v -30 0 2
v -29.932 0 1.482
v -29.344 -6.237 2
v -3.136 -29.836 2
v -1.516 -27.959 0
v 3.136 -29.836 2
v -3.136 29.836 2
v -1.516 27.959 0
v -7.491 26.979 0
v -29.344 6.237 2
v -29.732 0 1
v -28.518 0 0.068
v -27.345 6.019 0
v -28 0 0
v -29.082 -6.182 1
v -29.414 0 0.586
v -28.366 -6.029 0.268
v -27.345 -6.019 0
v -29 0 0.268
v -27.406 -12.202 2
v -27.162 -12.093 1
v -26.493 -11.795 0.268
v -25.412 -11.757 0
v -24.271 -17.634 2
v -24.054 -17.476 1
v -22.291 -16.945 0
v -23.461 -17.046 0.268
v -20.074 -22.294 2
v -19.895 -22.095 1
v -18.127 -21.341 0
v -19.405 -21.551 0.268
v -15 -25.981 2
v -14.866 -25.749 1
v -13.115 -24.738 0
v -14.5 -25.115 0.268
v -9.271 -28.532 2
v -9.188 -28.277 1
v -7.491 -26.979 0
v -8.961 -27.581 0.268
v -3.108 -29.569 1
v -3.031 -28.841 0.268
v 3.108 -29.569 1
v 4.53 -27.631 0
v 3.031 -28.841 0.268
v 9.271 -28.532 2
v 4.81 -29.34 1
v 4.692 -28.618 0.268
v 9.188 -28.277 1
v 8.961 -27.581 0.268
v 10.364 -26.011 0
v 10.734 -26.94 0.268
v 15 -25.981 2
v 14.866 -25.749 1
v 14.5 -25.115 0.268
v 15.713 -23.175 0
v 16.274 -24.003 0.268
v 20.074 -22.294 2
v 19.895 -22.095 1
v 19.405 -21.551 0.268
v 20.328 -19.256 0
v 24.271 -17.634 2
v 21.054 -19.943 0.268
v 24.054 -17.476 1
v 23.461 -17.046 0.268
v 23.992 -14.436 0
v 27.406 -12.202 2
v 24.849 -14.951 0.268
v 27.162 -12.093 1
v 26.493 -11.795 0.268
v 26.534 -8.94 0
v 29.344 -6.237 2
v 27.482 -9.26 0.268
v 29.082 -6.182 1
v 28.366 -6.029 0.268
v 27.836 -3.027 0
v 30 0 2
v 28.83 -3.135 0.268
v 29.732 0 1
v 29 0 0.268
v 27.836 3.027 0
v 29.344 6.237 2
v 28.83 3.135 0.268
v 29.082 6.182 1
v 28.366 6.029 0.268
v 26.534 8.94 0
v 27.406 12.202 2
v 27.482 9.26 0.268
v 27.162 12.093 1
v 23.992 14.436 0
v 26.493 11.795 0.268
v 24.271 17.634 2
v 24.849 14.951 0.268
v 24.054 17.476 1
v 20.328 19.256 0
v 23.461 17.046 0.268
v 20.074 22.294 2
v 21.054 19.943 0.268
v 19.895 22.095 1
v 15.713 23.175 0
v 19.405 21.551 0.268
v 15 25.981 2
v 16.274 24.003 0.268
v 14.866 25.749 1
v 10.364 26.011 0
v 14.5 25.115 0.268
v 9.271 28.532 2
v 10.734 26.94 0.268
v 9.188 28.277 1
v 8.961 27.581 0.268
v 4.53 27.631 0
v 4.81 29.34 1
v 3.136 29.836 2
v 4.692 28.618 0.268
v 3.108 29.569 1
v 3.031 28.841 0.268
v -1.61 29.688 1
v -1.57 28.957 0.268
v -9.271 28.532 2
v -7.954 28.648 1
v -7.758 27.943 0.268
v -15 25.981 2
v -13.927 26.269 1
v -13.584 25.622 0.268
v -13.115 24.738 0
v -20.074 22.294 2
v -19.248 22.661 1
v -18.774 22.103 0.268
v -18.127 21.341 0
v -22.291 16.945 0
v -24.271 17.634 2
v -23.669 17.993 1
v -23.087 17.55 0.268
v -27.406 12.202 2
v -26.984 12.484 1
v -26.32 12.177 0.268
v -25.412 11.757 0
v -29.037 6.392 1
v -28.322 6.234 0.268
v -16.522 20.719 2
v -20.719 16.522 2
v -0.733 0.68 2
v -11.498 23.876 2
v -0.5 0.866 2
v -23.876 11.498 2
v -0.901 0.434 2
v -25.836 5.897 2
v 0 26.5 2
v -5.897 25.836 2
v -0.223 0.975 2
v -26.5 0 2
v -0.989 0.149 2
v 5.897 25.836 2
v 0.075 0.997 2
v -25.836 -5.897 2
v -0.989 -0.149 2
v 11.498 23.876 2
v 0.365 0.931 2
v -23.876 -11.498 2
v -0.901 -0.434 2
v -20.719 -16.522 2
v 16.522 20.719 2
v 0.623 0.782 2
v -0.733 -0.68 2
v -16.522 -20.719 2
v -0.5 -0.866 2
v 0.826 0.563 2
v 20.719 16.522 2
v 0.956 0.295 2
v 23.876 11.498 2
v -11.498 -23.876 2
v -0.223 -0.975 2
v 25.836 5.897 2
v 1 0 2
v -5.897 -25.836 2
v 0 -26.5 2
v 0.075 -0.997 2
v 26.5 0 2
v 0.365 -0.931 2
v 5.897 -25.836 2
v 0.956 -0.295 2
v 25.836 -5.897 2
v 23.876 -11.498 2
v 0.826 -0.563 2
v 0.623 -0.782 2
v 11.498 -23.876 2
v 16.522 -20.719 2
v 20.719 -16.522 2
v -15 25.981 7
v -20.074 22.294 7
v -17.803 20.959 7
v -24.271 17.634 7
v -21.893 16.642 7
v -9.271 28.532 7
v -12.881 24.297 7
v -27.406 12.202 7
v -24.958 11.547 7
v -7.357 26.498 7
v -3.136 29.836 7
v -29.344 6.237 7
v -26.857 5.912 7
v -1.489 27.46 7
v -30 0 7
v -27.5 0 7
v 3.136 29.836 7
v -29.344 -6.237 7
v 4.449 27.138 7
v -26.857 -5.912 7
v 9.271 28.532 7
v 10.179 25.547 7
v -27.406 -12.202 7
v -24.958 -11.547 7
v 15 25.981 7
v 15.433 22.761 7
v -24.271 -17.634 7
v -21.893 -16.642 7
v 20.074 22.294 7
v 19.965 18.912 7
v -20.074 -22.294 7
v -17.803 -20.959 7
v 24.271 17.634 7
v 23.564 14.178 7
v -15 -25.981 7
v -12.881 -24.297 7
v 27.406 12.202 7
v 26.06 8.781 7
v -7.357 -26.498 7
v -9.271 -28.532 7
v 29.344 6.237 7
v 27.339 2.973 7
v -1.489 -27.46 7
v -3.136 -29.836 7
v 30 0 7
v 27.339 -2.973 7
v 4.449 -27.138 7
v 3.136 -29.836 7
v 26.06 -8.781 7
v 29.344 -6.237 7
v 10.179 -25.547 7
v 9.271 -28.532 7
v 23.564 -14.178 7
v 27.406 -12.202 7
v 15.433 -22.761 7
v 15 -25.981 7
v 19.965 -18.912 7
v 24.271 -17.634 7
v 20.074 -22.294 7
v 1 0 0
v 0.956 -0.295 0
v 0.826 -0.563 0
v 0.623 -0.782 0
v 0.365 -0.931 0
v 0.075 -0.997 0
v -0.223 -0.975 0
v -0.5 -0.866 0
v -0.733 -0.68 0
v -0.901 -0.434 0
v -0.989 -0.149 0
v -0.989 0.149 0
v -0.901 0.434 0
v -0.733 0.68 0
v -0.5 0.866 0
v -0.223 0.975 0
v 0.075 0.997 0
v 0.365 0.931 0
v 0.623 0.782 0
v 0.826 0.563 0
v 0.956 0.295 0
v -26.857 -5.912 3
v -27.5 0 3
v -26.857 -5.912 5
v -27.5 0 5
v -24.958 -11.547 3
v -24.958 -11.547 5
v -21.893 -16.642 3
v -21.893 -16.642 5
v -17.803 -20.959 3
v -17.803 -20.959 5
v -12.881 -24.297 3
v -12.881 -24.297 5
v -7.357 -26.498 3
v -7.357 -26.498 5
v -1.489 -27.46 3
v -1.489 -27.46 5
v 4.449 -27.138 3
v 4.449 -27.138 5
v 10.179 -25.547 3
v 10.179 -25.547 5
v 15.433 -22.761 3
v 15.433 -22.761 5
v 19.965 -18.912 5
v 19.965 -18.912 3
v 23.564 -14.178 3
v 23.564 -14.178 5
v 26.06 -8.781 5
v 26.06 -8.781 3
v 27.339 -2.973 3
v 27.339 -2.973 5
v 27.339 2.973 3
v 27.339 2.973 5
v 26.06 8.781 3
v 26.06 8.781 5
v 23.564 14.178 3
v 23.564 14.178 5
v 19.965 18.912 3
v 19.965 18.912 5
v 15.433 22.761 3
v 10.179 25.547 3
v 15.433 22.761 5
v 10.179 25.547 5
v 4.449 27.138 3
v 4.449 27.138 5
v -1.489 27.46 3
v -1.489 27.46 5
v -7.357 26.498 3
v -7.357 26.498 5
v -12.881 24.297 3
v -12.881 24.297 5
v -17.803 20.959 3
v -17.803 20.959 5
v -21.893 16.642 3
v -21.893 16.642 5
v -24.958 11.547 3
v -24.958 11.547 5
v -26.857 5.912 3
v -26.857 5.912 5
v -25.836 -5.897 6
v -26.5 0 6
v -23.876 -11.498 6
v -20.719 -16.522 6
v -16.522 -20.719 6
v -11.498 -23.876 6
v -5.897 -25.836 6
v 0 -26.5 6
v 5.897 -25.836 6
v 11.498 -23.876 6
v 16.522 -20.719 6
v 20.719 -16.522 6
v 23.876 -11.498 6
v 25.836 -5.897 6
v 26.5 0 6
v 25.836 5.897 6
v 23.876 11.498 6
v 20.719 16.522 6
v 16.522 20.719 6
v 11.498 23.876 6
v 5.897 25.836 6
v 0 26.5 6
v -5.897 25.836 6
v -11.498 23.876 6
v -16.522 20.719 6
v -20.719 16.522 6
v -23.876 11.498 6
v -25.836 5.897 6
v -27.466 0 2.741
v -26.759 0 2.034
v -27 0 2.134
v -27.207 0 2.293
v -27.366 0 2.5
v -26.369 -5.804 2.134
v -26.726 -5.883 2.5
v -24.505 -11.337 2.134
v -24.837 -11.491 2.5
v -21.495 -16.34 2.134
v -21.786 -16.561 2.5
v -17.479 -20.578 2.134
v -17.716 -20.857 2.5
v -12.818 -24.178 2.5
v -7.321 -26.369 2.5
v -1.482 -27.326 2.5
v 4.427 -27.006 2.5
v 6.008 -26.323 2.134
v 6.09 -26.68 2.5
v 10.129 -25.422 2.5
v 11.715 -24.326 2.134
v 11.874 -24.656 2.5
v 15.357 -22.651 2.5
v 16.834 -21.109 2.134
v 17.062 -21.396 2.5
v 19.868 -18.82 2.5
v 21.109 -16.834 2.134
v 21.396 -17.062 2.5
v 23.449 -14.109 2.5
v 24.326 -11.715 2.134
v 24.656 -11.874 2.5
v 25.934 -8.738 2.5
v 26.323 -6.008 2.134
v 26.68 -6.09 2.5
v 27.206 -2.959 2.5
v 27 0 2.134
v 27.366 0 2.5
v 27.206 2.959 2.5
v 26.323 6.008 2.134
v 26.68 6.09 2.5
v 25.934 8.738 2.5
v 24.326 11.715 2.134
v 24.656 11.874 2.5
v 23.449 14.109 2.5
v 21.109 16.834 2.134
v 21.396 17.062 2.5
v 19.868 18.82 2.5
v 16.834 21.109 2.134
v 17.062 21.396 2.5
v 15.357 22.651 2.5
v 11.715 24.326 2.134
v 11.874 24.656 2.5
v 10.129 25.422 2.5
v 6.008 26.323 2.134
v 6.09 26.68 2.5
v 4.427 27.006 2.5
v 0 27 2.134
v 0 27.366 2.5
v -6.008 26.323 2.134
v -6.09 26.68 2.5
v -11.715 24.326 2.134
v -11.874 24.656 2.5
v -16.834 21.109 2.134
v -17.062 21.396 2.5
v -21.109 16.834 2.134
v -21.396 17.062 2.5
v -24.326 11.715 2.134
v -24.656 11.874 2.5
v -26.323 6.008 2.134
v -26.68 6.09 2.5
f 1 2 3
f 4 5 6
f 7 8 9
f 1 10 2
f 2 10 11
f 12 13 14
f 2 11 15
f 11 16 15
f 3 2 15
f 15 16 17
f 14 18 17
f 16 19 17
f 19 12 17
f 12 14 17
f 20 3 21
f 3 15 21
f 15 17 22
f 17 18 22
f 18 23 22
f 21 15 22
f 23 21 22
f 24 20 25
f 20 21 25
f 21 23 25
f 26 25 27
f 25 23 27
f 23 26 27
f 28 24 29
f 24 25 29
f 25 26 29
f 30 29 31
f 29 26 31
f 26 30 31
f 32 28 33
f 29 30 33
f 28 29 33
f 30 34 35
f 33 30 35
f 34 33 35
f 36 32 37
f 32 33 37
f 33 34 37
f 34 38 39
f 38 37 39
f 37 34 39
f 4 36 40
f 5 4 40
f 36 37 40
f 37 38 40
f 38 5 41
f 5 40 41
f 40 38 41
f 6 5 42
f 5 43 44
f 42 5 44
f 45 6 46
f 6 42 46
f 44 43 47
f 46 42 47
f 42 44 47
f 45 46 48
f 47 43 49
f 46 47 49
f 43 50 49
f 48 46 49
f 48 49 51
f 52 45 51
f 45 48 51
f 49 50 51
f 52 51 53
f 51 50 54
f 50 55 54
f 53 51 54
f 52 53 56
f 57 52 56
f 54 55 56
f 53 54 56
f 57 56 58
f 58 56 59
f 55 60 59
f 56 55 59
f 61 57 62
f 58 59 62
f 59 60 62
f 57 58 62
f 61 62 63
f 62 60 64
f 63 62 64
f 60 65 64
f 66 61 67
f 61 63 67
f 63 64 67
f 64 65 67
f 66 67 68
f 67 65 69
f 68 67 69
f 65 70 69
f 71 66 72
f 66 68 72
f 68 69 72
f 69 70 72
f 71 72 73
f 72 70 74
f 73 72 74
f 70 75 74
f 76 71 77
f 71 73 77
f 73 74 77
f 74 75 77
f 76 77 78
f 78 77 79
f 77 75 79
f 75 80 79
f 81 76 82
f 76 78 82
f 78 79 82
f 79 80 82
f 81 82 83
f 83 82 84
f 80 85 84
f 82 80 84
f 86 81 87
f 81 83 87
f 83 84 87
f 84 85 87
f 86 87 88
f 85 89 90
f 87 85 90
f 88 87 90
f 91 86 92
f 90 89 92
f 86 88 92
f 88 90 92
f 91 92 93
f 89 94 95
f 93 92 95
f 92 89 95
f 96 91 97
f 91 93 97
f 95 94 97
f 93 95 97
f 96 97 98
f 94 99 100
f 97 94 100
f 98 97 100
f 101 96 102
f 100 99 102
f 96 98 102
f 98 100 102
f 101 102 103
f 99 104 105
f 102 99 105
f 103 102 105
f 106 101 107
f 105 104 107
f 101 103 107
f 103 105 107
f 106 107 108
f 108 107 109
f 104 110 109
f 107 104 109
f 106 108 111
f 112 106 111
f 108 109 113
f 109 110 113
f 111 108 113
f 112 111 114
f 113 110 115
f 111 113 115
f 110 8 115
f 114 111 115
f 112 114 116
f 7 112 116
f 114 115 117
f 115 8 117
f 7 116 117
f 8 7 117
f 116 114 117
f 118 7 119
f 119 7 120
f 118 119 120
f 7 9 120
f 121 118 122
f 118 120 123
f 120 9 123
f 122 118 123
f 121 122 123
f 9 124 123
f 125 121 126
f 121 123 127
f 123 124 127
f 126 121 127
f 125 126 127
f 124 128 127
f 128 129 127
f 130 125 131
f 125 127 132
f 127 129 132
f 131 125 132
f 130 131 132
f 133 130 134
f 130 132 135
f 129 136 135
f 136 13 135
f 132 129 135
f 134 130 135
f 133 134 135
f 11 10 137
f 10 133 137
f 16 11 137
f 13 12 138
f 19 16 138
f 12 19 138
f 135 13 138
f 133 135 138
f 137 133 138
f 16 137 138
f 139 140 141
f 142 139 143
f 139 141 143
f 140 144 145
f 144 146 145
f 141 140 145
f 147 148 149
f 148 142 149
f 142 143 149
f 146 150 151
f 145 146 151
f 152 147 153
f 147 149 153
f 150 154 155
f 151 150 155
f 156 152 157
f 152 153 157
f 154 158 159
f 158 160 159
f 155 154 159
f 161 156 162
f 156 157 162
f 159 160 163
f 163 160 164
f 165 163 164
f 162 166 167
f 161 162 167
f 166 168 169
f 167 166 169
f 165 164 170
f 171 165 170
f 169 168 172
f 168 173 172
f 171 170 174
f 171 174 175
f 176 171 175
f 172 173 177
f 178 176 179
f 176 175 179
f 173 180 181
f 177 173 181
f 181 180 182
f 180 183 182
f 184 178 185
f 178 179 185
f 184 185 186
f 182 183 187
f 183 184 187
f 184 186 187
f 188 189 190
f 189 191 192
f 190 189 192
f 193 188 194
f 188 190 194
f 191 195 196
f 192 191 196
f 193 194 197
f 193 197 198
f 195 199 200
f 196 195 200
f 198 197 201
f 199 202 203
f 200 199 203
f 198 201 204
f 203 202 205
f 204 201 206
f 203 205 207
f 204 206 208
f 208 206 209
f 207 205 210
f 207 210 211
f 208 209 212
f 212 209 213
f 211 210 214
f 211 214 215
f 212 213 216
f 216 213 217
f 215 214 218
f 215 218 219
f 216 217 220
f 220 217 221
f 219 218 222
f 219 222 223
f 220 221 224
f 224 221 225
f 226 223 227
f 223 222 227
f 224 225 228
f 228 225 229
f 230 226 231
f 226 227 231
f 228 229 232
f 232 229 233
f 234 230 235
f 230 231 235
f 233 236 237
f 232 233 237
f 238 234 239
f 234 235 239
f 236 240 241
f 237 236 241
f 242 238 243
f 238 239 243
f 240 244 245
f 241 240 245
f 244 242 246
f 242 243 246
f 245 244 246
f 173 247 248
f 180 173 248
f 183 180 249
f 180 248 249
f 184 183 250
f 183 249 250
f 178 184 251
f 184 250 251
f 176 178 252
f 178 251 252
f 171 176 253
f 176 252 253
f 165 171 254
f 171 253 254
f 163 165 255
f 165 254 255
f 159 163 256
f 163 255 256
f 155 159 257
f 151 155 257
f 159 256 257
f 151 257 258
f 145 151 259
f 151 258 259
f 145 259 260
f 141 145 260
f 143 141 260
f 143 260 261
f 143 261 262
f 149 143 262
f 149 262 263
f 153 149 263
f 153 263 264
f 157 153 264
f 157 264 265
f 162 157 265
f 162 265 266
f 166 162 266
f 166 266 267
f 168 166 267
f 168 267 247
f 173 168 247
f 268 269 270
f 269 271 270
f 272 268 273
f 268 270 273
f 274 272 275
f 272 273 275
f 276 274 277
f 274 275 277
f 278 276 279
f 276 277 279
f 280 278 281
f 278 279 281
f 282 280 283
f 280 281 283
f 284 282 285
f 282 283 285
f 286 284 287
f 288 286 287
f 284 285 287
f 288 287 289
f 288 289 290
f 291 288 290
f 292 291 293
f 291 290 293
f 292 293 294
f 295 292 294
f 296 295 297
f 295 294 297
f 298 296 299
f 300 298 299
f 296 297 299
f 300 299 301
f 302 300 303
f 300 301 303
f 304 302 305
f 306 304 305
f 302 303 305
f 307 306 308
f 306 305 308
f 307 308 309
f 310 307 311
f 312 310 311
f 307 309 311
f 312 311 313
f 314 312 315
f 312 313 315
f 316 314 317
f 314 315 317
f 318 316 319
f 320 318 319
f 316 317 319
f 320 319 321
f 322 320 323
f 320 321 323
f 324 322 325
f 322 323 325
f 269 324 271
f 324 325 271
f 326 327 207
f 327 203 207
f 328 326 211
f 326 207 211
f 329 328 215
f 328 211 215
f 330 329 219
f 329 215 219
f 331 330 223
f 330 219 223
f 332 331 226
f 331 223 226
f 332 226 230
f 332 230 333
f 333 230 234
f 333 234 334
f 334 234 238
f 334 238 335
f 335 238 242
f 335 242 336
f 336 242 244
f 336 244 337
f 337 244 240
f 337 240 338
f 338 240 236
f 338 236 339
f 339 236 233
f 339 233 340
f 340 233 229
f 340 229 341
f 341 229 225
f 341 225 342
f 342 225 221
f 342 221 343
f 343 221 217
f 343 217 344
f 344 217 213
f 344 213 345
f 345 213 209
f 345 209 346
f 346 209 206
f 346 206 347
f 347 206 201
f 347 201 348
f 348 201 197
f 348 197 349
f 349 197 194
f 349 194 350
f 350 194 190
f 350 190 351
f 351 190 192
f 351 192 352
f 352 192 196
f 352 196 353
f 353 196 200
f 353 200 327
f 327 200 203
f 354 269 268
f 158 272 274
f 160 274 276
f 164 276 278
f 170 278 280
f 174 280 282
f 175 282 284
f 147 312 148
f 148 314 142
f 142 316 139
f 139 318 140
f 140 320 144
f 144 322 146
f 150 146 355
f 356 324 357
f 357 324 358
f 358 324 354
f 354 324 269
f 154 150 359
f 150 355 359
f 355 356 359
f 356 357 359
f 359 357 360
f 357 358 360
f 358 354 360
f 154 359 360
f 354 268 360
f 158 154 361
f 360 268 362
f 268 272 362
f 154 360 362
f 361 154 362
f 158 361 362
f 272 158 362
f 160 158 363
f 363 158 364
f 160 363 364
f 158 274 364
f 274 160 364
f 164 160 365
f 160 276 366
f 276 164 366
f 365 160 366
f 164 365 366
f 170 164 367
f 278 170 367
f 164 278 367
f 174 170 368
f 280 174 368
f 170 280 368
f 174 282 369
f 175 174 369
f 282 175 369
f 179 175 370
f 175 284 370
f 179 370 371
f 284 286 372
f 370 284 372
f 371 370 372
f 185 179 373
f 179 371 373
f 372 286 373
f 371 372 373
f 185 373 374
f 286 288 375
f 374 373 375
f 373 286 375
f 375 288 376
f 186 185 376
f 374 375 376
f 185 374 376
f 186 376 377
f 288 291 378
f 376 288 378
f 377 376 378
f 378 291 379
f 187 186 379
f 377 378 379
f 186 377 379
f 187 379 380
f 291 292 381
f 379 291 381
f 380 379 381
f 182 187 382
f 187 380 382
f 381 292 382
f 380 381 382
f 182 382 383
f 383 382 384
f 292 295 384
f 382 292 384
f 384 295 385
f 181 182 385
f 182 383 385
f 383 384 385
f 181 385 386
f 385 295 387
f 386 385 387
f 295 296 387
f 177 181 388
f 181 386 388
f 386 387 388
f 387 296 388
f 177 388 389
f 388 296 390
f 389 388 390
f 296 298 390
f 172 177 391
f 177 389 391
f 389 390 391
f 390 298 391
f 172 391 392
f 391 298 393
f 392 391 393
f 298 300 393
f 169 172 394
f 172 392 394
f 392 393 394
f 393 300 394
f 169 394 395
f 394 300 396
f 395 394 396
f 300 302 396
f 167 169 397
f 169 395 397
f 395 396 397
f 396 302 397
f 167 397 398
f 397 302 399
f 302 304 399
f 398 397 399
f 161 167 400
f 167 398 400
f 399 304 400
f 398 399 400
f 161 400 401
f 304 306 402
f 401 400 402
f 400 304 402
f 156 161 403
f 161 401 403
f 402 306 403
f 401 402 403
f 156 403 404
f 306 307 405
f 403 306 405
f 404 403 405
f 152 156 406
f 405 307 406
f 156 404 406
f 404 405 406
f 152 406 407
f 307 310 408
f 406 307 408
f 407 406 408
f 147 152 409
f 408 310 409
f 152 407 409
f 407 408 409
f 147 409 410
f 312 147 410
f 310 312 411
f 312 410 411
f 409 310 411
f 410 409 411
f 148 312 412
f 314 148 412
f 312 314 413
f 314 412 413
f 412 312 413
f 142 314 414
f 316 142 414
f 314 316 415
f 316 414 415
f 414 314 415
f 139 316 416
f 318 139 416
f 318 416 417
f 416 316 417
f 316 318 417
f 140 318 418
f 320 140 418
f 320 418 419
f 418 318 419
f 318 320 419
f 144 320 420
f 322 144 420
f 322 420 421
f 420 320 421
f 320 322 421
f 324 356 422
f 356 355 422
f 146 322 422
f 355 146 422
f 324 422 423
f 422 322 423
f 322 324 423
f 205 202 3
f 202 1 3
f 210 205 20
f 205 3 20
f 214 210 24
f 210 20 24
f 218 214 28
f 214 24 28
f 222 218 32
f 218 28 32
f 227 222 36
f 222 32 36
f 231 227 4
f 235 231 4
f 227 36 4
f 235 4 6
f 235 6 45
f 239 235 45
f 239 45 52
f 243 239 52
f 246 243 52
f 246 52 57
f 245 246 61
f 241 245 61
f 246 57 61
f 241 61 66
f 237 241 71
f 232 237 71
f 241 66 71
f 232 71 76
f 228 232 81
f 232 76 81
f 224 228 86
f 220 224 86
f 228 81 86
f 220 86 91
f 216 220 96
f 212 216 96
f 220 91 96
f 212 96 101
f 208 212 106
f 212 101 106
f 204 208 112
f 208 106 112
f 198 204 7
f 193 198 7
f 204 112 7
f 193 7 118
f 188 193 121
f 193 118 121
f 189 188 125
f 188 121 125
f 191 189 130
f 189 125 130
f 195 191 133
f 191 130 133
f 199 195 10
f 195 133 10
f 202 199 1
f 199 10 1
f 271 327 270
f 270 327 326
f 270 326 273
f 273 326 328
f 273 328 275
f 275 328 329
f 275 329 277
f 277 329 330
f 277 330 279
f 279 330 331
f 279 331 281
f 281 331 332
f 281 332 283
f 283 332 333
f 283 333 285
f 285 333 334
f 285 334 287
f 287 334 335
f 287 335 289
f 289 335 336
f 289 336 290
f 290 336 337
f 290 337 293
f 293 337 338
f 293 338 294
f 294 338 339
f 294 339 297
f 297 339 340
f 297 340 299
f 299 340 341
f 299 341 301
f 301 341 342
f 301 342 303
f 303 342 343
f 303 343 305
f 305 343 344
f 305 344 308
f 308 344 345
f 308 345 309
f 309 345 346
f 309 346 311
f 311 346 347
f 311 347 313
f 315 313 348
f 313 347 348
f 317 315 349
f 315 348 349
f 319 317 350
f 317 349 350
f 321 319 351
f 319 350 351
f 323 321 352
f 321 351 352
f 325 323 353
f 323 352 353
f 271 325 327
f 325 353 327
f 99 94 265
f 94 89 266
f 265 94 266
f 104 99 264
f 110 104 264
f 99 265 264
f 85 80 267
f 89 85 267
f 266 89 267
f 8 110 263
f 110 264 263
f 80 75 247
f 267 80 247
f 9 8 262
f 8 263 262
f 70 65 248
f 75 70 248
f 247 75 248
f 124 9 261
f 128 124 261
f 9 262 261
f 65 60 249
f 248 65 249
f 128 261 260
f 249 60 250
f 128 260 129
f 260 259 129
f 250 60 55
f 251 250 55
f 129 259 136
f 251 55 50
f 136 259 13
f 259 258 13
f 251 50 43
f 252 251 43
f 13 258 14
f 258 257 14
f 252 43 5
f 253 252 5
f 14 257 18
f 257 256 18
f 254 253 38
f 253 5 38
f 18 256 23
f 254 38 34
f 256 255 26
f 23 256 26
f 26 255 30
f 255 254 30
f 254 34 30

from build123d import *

# Parameters (mm, degrees)
F2_R     = 1
F3_DEPTH = 25


with BuildPart() as f1:
    # F0 (on Front) → F1 (revolve)
    with BuildSketch(Plane.XZ):
        with BuildLine():
            Line((-28, 0), (0, 0))
            Line((0, 0), (0, 2))
            Line((0, 2), (-26.5, 2))
            ThreePointArc((-26.5, 2), (-27.207107, 2.292893), (-27.5, 3))
            Line((-27.5, 3), (-27.5, 5))
            Line((-27.5, 5), (-26.5, 6))
            Line((-26.5, 6), (-27.5, 7))
            Line((-27.5, 7), (-30, 7))
            Line((-30, 7), (-30, 2))
            ThreePointArc((-30, 2), (-29.414214, 0.585786), (-28, 0))
        make_face()
    revolve(axis=Axis((0, 0, 1), (0, 0, 1)))

    # F2 (on face) → F3 (cut)
    with BuildSketch(Plane(origin=(0, 0, 0), x_dir=(1, 0, 0), z_dir=(0, 0, -1))):
        Circle(F2_R)
    extrude(amount=-F3_DEPTH, mode=Mode.SUBTRACT)


solid = f1.part
